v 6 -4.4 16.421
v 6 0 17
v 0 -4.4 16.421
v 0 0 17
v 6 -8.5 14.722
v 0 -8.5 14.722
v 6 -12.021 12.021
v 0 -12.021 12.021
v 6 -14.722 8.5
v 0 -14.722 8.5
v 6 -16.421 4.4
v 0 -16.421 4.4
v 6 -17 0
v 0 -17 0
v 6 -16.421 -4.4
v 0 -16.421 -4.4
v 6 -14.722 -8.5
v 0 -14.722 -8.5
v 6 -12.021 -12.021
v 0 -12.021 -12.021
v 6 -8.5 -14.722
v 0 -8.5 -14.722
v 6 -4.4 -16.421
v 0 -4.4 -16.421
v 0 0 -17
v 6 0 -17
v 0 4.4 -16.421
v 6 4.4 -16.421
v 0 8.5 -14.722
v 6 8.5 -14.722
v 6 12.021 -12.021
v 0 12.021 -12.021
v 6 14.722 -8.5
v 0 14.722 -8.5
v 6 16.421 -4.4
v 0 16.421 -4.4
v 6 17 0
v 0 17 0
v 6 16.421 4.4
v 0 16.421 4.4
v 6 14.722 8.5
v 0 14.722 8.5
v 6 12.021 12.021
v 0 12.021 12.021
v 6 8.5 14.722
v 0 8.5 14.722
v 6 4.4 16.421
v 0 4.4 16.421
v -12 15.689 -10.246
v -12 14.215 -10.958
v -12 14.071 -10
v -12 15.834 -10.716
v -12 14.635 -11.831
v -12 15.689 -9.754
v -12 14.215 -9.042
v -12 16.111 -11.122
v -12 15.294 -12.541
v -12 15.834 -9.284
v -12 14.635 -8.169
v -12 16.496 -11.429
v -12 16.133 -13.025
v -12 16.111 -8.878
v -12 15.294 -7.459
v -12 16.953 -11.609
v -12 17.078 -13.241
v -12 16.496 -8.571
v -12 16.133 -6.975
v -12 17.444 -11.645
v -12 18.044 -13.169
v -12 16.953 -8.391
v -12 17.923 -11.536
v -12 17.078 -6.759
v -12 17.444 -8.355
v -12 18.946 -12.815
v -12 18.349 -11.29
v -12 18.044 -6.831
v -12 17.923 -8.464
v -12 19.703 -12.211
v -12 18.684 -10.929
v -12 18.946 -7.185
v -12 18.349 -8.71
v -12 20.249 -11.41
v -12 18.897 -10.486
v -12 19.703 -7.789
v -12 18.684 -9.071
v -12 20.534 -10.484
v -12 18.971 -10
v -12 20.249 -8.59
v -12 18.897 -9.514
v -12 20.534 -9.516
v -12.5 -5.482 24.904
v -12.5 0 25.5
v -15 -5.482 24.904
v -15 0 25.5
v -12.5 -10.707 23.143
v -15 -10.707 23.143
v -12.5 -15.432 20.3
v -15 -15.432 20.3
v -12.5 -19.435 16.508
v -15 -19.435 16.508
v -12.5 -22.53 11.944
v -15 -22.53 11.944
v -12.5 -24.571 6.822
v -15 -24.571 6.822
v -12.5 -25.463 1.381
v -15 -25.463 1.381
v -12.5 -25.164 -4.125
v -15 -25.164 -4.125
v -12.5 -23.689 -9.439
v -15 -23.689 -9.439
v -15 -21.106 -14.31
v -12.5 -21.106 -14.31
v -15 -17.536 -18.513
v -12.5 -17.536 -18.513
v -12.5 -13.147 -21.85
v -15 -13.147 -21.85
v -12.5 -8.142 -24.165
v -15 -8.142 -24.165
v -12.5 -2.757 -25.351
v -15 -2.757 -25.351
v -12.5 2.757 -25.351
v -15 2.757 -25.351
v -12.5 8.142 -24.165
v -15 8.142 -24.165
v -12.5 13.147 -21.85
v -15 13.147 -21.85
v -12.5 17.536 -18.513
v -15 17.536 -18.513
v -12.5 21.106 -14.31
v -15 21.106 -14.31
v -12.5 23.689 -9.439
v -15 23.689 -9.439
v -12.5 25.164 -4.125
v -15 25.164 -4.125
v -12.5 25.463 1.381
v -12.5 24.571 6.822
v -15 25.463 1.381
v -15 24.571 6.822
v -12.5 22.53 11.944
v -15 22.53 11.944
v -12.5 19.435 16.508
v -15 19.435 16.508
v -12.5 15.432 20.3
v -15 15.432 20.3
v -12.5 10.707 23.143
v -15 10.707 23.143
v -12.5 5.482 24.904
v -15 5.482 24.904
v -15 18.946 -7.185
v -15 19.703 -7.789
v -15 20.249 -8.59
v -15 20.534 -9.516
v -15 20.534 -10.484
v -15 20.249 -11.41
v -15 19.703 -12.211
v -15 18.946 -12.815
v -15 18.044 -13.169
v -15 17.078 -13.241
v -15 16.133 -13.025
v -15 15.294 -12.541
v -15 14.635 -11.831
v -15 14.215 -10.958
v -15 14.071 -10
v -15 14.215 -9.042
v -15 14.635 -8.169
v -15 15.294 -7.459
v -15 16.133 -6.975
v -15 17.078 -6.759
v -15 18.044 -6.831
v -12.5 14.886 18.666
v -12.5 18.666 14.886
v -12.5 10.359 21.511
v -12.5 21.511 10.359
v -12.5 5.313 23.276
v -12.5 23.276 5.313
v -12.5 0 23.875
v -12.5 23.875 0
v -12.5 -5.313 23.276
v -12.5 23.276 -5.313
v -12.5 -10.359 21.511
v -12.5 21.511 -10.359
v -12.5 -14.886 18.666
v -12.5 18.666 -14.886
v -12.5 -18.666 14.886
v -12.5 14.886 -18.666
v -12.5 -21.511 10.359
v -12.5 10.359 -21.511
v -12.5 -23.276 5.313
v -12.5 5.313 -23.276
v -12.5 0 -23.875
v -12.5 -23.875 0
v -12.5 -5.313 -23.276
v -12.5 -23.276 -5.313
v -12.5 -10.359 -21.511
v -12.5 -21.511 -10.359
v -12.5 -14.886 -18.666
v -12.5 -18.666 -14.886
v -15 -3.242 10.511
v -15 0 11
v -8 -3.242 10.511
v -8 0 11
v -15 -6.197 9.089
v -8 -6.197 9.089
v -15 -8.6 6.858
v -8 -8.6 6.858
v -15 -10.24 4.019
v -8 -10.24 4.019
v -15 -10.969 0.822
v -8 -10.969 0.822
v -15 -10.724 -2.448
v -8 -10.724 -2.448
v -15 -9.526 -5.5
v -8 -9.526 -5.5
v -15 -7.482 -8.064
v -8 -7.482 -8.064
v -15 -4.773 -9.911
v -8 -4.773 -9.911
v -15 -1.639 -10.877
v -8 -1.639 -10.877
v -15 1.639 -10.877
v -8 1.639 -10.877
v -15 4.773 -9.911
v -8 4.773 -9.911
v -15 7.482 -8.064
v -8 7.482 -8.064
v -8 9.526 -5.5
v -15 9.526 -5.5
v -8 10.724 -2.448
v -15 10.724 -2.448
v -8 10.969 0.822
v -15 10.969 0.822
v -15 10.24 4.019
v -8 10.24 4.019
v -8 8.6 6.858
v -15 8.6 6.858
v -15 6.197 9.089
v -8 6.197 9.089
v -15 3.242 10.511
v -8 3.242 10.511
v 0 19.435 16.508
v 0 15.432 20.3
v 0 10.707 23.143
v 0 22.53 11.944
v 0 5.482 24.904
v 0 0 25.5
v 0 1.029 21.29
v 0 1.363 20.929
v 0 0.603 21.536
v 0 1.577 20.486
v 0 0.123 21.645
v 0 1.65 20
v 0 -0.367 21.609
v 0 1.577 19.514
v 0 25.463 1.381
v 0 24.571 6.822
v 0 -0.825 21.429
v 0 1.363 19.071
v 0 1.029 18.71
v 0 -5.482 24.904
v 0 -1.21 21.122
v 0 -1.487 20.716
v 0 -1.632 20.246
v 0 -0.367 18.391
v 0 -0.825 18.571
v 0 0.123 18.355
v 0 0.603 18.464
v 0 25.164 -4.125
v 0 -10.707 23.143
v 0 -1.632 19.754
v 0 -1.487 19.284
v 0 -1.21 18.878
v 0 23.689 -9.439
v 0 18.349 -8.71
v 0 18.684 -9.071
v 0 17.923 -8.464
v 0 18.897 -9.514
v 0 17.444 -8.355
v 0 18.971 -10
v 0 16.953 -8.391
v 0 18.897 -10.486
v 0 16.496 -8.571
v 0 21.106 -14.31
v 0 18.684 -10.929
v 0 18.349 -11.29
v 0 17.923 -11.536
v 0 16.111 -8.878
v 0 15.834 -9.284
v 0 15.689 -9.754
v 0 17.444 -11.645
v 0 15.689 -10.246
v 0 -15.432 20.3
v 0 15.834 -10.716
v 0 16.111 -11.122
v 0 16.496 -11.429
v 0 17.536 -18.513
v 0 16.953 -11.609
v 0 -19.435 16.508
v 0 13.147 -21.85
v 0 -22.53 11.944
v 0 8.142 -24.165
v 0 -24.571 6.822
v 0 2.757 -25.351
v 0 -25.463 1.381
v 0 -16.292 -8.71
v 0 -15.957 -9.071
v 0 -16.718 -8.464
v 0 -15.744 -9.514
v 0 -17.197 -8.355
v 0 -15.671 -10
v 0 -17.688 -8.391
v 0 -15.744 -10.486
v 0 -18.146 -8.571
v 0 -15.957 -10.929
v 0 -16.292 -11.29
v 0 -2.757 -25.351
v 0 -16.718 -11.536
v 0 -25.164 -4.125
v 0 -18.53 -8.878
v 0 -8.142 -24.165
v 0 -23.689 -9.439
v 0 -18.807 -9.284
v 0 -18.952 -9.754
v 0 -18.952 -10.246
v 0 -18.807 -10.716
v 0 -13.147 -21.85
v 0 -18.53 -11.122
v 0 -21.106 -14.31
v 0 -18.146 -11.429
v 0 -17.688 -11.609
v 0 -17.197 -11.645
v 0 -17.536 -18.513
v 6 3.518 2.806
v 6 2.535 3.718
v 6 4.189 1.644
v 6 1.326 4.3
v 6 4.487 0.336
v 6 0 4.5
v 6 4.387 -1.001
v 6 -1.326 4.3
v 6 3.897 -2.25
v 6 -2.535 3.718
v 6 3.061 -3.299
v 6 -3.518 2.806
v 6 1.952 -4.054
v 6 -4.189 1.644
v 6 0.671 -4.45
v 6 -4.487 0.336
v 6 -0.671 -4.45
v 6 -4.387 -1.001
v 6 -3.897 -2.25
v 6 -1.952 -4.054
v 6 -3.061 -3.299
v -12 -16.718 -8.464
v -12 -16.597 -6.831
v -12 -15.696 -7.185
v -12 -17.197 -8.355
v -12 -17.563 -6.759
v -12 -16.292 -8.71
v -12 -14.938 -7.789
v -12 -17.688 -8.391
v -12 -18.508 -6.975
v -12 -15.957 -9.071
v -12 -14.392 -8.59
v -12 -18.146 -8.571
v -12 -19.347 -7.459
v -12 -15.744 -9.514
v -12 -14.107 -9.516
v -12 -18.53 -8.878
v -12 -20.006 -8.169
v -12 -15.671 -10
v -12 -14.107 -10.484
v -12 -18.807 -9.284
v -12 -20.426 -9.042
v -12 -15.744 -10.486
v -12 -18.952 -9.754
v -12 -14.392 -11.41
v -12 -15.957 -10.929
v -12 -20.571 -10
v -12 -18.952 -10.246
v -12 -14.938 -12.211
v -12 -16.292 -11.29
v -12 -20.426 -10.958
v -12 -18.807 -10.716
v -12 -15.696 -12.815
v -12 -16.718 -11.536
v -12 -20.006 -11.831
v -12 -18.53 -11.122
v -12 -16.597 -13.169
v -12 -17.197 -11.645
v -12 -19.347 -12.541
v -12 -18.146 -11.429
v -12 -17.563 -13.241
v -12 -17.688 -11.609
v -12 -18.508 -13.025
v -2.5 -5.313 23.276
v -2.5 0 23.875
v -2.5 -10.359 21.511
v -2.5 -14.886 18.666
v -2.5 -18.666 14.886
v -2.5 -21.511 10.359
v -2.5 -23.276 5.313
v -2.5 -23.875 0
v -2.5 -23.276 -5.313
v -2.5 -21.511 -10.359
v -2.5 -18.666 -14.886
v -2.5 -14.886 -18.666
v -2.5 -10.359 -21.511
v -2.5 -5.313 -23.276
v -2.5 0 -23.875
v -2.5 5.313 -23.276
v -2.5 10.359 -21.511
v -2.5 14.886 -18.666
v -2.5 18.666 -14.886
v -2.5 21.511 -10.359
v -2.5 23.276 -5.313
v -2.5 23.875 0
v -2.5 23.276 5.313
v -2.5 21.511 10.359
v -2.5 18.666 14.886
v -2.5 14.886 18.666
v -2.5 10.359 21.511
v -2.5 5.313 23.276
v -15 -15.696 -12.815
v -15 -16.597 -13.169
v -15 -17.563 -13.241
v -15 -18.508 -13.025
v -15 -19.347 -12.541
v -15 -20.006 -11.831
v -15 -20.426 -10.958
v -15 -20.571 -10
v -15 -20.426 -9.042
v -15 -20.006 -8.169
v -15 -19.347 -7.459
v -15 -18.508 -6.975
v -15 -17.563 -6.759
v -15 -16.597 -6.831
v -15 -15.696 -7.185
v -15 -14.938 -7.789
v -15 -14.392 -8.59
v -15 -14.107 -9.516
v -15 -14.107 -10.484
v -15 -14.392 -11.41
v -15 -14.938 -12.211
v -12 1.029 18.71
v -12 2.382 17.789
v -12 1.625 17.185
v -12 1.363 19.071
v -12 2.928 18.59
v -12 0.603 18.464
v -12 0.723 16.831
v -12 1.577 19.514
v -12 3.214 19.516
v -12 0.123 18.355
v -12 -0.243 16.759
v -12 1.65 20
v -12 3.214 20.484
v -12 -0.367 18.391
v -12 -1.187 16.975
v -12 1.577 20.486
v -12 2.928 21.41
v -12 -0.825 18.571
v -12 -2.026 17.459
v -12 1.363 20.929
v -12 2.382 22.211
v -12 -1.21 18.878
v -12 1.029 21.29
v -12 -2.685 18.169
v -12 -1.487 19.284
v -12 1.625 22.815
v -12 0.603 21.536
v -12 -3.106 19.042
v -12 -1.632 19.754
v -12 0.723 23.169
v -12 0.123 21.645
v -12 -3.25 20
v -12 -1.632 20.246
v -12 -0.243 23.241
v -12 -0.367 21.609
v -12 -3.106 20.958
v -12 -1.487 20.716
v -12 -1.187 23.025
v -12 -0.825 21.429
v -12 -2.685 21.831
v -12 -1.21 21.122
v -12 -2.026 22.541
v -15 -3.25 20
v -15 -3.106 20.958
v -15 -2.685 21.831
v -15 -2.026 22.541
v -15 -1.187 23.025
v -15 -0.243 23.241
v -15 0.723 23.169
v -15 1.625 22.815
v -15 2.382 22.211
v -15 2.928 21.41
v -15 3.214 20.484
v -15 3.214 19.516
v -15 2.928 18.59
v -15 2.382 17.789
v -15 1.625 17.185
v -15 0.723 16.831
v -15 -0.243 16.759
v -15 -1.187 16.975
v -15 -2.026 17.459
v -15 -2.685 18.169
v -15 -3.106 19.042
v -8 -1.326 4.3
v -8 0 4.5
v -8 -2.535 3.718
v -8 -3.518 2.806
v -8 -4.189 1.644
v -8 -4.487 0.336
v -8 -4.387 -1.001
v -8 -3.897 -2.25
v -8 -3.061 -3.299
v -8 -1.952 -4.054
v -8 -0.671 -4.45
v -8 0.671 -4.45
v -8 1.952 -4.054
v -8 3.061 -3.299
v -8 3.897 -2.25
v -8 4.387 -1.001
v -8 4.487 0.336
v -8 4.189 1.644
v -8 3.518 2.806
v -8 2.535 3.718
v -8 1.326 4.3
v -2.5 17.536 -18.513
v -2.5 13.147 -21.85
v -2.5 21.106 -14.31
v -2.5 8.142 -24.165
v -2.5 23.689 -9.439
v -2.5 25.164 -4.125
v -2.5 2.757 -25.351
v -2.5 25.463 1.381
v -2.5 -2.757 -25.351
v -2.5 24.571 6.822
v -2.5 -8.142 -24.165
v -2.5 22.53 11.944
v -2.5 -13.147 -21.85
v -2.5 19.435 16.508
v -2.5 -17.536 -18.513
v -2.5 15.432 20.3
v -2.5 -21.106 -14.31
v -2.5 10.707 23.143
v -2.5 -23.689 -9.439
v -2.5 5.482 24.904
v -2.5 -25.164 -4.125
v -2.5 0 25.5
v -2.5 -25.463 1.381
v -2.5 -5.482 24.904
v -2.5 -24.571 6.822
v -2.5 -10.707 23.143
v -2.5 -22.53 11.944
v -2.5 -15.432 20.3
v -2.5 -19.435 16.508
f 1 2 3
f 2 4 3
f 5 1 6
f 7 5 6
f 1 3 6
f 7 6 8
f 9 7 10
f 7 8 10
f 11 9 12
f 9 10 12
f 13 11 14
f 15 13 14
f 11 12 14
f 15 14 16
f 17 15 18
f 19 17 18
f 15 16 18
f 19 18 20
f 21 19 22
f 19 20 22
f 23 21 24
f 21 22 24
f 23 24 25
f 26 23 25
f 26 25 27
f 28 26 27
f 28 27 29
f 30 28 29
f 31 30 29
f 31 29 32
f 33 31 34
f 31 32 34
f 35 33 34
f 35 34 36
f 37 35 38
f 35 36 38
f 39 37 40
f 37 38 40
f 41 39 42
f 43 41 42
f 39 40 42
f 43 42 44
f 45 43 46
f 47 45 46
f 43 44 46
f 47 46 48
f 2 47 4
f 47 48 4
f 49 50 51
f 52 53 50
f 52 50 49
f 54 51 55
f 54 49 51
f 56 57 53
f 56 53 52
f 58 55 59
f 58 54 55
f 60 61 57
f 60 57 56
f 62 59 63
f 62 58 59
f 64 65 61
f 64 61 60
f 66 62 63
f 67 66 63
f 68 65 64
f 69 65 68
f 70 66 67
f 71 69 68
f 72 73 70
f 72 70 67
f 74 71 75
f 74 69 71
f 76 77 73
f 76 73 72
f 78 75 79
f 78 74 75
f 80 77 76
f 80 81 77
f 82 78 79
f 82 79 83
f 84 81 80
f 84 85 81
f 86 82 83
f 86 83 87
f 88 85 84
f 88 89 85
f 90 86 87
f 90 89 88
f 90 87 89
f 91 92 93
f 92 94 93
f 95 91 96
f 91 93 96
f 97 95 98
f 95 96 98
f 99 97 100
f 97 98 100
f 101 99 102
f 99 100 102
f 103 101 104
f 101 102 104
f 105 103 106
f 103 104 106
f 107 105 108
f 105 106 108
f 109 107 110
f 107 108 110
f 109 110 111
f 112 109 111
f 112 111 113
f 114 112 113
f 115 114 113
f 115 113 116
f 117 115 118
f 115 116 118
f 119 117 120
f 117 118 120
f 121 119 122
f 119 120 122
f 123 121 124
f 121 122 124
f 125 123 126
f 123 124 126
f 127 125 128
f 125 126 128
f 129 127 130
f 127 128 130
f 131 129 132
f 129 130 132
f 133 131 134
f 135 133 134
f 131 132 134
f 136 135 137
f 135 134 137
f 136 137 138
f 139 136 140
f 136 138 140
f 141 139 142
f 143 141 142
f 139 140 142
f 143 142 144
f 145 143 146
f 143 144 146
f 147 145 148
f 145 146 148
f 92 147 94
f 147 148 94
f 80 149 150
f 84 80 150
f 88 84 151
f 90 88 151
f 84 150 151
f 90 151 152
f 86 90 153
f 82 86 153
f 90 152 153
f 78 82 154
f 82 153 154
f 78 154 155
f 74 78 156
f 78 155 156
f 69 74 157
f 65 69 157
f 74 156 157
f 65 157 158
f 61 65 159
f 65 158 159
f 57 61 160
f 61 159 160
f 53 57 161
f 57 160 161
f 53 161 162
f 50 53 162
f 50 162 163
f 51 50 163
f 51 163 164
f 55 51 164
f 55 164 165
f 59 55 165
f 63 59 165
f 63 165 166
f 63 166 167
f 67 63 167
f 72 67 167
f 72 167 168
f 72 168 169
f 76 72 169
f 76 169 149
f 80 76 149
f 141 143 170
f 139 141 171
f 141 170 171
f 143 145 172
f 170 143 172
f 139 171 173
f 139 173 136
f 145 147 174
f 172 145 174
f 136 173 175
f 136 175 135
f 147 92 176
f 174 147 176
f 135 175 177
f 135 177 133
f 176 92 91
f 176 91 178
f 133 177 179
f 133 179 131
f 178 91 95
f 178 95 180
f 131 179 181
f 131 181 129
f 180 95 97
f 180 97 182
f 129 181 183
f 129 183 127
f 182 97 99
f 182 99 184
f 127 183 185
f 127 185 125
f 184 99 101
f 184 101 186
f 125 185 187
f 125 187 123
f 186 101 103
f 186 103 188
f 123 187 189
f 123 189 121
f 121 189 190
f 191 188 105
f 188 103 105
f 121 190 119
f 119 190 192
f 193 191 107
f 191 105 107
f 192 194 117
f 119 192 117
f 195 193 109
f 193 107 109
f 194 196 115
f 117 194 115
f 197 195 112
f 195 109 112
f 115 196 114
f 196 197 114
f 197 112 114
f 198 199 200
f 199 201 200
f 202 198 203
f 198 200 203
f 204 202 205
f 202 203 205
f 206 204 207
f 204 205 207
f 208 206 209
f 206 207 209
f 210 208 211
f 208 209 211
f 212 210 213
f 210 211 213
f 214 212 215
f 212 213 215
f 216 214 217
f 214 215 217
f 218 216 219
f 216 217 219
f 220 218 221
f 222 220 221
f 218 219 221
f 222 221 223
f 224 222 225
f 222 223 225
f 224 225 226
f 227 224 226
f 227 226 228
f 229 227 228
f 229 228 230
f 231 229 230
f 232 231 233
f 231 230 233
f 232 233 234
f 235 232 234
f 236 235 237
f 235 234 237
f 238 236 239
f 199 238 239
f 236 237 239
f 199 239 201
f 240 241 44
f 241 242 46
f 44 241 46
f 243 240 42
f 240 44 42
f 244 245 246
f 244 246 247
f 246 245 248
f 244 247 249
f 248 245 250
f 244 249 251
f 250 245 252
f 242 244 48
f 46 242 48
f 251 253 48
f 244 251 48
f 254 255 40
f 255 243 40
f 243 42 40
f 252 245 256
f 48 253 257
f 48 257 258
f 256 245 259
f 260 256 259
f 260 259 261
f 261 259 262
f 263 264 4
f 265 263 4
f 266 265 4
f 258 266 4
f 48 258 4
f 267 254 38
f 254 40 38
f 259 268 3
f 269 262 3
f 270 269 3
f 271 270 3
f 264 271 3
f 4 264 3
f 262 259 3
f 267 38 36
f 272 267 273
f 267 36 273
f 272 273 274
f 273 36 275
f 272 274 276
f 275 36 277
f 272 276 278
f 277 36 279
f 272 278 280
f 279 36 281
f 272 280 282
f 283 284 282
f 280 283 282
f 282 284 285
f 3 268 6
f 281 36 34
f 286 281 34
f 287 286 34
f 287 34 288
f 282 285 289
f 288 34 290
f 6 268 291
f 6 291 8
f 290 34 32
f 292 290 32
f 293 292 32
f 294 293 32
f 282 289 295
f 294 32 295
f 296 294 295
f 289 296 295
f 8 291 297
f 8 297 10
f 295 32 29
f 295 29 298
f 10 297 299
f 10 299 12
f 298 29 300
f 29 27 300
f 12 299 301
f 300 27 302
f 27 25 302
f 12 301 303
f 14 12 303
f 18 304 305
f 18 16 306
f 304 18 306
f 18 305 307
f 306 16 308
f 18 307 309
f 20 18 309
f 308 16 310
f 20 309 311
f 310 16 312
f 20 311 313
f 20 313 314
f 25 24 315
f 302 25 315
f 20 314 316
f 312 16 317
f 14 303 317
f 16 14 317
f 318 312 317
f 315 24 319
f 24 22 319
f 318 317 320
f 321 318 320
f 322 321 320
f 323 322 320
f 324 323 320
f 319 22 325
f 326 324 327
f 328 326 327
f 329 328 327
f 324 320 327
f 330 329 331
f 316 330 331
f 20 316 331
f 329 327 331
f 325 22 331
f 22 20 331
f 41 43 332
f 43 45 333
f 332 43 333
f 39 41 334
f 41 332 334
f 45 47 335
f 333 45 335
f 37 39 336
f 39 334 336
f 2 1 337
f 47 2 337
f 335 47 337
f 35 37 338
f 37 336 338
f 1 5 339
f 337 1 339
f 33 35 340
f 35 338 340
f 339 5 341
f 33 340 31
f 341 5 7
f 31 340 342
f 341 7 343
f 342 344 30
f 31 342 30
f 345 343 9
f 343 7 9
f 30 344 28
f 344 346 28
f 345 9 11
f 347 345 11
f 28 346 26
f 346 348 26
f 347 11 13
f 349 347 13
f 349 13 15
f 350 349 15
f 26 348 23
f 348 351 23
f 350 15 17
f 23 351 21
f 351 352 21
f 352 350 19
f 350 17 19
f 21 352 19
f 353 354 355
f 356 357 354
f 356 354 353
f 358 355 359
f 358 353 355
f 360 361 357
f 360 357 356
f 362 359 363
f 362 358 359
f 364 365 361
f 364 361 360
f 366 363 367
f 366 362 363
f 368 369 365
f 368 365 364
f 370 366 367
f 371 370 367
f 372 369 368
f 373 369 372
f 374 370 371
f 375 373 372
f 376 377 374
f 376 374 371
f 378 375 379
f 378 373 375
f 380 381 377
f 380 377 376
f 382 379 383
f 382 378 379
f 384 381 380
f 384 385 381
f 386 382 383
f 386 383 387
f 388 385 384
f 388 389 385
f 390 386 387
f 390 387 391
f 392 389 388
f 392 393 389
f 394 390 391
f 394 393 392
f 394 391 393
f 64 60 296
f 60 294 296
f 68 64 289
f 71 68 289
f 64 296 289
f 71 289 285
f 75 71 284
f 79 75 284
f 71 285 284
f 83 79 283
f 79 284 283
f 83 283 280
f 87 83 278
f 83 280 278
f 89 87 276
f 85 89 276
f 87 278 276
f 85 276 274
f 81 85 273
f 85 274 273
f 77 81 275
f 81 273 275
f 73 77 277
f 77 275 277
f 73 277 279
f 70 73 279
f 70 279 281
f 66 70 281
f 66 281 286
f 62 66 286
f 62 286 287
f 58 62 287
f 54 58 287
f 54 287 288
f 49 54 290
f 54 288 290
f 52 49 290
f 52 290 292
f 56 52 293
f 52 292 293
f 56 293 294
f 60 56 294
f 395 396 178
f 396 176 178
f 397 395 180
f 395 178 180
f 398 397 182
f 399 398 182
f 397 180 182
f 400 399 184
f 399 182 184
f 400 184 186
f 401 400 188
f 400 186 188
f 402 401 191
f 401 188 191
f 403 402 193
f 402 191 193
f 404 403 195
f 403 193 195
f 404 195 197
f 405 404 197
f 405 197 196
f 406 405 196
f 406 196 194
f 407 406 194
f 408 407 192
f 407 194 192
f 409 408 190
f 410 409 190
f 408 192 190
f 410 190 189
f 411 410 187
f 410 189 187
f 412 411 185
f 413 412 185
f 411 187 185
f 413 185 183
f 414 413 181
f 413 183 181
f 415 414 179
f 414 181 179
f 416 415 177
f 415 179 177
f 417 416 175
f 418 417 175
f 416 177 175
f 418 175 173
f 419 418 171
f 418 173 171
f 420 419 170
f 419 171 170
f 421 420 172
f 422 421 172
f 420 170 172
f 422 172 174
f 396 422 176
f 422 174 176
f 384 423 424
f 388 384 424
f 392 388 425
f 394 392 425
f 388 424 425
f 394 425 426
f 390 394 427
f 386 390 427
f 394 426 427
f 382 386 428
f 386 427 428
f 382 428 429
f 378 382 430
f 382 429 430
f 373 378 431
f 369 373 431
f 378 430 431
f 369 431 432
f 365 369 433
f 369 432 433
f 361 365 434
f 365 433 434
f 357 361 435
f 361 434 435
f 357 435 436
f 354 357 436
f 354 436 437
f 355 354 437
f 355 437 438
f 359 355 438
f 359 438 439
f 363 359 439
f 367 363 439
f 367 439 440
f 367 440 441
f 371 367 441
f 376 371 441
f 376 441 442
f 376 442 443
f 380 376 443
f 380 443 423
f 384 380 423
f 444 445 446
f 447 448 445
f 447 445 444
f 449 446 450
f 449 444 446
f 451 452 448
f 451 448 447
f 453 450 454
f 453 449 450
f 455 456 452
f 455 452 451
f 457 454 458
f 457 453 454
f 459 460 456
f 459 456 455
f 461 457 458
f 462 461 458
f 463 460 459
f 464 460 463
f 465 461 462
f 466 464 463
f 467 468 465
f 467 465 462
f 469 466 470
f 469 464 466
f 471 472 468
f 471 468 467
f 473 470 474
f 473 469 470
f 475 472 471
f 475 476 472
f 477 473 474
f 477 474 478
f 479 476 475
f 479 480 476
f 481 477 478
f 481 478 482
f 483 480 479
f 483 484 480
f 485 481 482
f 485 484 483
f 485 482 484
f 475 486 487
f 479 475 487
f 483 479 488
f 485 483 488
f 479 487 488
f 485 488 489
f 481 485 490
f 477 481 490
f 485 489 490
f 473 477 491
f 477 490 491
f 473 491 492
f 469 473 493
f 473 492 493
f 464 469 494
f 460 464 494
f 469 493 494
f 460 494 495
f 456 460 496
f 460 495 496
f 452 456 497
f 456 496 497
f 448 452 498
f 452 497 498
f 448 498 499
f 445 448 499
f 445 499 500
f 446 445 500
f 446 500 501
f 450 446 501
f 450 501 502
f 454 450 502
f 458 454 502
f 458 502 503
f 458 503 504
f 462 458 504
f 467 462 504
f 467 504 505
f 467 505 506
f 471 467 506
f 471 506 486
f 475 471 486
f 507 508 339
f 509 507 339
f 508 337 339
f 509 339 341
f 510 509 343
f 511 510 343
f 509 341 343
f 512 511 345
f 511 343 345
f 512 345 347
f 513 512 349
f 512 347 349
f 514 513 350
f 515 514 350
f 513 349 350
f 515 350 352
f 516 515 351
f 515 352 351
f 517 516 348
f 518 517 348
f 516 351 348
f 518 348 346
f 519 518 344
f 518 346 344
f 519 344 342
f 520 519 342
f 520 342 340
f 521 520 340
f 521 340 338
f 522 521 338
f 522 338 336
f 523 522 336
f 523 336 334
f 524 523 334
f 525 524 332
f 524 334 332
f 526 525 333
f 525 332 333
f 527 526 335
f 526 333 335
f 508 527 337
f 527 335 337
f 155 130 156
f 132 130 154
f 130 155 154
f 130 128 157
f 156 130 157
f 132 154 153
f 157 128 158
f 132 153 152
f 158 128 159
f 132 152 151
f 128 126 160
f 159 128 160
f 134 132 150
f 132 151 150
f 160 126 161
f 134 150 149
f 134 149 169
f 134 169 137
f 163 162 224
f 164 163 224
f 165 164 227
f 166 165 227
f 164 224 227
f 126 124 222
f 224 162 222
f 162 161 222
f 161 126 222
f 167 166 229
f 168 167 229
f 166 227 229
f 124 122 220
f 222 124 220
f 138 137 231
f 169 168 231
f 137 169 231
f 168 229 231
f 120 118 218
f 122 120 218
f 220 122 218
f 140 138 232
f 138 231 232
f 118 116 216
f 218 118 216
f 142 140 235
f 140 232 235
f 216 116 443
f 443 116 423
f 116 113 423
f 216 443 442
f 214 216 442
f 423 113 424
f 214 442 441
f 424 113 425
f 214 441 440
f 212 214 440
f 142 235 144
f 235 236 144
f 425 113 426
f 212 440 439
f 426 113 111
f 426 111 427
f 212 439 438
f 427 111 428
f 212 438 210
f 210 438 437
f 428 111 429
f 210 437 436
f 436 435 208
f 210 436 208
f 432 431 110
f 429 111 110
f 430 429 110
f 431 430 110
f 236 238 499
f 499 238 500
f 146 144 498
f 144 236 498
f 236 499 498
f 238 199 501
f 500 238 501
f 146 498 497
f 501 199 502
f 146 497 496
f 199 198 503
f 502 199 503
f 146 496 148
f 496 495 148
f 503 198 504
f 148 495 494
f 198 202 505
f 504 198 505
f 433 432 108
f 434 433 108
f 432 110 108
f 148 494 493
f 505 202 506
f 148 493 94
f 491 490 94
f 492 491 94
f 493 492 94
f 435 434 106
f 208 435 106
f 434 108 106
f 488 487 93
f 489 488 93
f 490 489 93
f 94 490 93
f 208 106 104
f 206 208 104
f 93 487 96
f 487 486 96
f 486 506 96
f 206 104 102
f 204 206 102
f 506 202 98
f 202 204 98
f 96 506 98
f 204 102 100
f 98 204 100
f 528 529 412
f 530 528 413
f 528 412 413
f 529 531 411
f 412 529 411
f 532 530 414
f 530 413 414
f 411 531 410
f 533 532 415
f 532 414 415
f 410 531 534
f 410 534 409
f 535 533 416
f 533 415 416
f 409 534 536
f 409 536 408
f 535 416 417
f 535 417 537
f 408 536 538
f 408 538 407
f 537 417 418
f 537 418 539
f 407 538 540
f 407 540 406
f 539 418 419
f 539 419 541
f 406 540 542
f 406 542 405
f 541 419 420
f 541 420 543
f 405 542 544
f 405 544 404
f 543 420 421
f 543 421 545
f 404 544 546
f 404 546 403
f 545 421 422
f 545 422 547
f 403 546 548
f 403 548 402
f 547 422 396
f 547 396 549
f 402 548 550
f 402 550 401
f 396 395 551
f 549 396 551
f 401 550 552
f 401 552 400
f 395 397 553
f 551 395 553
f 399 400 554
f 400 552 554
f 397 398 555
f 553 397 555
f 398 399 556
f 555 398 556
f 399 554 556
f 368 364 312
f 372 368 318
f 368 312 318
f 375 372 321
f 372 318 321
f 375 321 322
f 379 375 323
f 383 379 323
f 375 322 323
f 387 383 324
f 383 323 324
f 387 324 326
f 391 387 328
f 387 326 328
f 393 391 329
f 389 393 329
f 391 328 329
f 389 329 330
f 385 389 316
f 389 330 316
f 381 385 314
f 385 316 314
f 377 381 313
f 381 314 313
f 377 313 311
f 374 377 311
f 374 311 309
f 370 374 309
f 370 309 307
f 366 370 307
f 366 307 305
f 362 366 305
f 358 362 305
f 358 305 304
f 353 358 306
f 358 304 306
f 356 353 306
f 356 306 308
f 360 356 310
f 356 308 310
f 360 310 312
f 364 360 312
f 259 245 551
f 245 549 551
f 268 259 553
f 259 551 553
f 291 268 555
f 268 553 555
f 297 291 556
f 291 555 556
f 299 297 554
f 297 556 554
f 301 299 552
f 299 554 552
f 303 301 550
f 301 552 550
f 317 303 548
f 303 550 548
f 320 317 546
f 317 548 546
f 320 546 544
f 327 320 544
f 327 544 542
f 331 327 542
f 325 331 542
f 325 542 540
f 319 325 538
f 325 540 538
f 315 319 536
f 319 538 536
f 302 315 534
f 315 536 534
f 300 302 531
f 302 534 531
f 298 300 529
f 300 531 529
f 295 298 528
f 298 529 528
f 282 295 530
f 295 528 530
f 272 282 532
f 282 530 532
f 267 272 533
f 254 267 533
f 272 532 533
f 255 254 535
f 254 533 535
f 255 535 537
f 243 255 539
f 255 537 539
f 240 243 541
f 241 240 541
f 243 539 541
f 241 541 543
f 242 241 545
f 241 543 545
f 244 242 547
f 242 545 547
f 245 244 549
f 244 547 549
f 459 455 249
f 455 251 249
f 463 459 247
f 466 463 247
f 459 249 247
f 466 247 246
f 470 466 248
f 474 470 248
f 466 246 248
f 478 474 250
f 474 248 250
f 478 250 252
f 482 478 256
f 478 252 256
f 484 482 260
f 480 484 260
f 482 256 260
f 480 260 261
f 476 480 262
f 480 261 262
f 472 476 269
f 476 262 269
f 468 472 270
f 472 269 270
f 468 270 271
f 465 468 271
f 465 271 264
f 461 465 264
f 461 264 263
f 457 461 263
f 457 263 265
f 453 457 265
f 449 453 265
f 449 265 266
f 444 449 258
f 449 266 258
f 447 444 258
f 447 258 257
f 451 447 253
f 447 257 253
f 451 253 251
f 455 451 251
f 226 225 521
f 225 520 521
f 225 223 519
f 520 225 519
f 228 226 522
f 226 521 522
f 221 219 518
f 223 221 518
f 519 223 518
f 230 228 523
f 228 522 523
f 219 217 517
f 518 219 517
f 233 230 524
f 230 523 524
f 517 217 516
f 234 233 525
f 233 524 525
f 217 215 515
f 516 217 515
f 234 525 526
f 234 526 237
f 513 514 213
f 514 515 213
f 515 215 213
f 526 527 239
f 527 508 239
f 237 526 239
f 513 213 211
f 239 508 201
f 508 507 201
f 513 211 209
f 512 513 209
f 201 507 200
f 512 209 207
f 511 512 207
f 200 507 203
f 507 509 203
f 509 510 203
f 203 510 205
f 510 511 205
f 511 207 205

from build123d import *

# Parameters (mm, degrees)
F3_D            = 3.3
F3_CBORE_D      = 6.5
F3_CBORE_DEPTH  = 3
F3_COPIES_COUNT = 3


# Not quite as in the source:
# - a pattern or mirror of a feature is missing from the dataset's text; its kind, count and spacing are read off the source's solid


with BuildPart() as f1:
    # F0 (on Front) → F1 (revolve)
    with BuildSketch(Plane.XZ):
        Polygon((-8, 4.5), (6, 4.5), (6, 17), (0, 17), (0, 25.5), (-2.5, 25.5), (-2.5, 23.875), (-12.5, 23.875), (-12.5, 25.5), (-15, 25.5), (-15, 11), (-8, 11), align=None)
    revolve(axis=Axis((0.8759173031, 0, 0), (1, 0, 0)))

    # F3 (through all)
    with Locations(Plane(origin=(-15, 0, 0), x_dir=(0, -1, 0), z_dir=(-1, 0, 0))):
        with Locations((0, 20)):
            f3 = CounterBoreHole(F3_D / 2, F3_CBORE_D / 2, F3_CBORE_DEPTH)

    # F3_copies: F3 ×3 about axis
    f3_copies_axis = Axis((0, 0, 0), (1, 0, 0))
    for i in range(1, F3_COPIES_COUNT):
        add(f3.rotate(f3_copies_axis, i * 360 / F3_COPIES_COUNT), mode=Mode.SUBTRACT)


solid = f1.part
